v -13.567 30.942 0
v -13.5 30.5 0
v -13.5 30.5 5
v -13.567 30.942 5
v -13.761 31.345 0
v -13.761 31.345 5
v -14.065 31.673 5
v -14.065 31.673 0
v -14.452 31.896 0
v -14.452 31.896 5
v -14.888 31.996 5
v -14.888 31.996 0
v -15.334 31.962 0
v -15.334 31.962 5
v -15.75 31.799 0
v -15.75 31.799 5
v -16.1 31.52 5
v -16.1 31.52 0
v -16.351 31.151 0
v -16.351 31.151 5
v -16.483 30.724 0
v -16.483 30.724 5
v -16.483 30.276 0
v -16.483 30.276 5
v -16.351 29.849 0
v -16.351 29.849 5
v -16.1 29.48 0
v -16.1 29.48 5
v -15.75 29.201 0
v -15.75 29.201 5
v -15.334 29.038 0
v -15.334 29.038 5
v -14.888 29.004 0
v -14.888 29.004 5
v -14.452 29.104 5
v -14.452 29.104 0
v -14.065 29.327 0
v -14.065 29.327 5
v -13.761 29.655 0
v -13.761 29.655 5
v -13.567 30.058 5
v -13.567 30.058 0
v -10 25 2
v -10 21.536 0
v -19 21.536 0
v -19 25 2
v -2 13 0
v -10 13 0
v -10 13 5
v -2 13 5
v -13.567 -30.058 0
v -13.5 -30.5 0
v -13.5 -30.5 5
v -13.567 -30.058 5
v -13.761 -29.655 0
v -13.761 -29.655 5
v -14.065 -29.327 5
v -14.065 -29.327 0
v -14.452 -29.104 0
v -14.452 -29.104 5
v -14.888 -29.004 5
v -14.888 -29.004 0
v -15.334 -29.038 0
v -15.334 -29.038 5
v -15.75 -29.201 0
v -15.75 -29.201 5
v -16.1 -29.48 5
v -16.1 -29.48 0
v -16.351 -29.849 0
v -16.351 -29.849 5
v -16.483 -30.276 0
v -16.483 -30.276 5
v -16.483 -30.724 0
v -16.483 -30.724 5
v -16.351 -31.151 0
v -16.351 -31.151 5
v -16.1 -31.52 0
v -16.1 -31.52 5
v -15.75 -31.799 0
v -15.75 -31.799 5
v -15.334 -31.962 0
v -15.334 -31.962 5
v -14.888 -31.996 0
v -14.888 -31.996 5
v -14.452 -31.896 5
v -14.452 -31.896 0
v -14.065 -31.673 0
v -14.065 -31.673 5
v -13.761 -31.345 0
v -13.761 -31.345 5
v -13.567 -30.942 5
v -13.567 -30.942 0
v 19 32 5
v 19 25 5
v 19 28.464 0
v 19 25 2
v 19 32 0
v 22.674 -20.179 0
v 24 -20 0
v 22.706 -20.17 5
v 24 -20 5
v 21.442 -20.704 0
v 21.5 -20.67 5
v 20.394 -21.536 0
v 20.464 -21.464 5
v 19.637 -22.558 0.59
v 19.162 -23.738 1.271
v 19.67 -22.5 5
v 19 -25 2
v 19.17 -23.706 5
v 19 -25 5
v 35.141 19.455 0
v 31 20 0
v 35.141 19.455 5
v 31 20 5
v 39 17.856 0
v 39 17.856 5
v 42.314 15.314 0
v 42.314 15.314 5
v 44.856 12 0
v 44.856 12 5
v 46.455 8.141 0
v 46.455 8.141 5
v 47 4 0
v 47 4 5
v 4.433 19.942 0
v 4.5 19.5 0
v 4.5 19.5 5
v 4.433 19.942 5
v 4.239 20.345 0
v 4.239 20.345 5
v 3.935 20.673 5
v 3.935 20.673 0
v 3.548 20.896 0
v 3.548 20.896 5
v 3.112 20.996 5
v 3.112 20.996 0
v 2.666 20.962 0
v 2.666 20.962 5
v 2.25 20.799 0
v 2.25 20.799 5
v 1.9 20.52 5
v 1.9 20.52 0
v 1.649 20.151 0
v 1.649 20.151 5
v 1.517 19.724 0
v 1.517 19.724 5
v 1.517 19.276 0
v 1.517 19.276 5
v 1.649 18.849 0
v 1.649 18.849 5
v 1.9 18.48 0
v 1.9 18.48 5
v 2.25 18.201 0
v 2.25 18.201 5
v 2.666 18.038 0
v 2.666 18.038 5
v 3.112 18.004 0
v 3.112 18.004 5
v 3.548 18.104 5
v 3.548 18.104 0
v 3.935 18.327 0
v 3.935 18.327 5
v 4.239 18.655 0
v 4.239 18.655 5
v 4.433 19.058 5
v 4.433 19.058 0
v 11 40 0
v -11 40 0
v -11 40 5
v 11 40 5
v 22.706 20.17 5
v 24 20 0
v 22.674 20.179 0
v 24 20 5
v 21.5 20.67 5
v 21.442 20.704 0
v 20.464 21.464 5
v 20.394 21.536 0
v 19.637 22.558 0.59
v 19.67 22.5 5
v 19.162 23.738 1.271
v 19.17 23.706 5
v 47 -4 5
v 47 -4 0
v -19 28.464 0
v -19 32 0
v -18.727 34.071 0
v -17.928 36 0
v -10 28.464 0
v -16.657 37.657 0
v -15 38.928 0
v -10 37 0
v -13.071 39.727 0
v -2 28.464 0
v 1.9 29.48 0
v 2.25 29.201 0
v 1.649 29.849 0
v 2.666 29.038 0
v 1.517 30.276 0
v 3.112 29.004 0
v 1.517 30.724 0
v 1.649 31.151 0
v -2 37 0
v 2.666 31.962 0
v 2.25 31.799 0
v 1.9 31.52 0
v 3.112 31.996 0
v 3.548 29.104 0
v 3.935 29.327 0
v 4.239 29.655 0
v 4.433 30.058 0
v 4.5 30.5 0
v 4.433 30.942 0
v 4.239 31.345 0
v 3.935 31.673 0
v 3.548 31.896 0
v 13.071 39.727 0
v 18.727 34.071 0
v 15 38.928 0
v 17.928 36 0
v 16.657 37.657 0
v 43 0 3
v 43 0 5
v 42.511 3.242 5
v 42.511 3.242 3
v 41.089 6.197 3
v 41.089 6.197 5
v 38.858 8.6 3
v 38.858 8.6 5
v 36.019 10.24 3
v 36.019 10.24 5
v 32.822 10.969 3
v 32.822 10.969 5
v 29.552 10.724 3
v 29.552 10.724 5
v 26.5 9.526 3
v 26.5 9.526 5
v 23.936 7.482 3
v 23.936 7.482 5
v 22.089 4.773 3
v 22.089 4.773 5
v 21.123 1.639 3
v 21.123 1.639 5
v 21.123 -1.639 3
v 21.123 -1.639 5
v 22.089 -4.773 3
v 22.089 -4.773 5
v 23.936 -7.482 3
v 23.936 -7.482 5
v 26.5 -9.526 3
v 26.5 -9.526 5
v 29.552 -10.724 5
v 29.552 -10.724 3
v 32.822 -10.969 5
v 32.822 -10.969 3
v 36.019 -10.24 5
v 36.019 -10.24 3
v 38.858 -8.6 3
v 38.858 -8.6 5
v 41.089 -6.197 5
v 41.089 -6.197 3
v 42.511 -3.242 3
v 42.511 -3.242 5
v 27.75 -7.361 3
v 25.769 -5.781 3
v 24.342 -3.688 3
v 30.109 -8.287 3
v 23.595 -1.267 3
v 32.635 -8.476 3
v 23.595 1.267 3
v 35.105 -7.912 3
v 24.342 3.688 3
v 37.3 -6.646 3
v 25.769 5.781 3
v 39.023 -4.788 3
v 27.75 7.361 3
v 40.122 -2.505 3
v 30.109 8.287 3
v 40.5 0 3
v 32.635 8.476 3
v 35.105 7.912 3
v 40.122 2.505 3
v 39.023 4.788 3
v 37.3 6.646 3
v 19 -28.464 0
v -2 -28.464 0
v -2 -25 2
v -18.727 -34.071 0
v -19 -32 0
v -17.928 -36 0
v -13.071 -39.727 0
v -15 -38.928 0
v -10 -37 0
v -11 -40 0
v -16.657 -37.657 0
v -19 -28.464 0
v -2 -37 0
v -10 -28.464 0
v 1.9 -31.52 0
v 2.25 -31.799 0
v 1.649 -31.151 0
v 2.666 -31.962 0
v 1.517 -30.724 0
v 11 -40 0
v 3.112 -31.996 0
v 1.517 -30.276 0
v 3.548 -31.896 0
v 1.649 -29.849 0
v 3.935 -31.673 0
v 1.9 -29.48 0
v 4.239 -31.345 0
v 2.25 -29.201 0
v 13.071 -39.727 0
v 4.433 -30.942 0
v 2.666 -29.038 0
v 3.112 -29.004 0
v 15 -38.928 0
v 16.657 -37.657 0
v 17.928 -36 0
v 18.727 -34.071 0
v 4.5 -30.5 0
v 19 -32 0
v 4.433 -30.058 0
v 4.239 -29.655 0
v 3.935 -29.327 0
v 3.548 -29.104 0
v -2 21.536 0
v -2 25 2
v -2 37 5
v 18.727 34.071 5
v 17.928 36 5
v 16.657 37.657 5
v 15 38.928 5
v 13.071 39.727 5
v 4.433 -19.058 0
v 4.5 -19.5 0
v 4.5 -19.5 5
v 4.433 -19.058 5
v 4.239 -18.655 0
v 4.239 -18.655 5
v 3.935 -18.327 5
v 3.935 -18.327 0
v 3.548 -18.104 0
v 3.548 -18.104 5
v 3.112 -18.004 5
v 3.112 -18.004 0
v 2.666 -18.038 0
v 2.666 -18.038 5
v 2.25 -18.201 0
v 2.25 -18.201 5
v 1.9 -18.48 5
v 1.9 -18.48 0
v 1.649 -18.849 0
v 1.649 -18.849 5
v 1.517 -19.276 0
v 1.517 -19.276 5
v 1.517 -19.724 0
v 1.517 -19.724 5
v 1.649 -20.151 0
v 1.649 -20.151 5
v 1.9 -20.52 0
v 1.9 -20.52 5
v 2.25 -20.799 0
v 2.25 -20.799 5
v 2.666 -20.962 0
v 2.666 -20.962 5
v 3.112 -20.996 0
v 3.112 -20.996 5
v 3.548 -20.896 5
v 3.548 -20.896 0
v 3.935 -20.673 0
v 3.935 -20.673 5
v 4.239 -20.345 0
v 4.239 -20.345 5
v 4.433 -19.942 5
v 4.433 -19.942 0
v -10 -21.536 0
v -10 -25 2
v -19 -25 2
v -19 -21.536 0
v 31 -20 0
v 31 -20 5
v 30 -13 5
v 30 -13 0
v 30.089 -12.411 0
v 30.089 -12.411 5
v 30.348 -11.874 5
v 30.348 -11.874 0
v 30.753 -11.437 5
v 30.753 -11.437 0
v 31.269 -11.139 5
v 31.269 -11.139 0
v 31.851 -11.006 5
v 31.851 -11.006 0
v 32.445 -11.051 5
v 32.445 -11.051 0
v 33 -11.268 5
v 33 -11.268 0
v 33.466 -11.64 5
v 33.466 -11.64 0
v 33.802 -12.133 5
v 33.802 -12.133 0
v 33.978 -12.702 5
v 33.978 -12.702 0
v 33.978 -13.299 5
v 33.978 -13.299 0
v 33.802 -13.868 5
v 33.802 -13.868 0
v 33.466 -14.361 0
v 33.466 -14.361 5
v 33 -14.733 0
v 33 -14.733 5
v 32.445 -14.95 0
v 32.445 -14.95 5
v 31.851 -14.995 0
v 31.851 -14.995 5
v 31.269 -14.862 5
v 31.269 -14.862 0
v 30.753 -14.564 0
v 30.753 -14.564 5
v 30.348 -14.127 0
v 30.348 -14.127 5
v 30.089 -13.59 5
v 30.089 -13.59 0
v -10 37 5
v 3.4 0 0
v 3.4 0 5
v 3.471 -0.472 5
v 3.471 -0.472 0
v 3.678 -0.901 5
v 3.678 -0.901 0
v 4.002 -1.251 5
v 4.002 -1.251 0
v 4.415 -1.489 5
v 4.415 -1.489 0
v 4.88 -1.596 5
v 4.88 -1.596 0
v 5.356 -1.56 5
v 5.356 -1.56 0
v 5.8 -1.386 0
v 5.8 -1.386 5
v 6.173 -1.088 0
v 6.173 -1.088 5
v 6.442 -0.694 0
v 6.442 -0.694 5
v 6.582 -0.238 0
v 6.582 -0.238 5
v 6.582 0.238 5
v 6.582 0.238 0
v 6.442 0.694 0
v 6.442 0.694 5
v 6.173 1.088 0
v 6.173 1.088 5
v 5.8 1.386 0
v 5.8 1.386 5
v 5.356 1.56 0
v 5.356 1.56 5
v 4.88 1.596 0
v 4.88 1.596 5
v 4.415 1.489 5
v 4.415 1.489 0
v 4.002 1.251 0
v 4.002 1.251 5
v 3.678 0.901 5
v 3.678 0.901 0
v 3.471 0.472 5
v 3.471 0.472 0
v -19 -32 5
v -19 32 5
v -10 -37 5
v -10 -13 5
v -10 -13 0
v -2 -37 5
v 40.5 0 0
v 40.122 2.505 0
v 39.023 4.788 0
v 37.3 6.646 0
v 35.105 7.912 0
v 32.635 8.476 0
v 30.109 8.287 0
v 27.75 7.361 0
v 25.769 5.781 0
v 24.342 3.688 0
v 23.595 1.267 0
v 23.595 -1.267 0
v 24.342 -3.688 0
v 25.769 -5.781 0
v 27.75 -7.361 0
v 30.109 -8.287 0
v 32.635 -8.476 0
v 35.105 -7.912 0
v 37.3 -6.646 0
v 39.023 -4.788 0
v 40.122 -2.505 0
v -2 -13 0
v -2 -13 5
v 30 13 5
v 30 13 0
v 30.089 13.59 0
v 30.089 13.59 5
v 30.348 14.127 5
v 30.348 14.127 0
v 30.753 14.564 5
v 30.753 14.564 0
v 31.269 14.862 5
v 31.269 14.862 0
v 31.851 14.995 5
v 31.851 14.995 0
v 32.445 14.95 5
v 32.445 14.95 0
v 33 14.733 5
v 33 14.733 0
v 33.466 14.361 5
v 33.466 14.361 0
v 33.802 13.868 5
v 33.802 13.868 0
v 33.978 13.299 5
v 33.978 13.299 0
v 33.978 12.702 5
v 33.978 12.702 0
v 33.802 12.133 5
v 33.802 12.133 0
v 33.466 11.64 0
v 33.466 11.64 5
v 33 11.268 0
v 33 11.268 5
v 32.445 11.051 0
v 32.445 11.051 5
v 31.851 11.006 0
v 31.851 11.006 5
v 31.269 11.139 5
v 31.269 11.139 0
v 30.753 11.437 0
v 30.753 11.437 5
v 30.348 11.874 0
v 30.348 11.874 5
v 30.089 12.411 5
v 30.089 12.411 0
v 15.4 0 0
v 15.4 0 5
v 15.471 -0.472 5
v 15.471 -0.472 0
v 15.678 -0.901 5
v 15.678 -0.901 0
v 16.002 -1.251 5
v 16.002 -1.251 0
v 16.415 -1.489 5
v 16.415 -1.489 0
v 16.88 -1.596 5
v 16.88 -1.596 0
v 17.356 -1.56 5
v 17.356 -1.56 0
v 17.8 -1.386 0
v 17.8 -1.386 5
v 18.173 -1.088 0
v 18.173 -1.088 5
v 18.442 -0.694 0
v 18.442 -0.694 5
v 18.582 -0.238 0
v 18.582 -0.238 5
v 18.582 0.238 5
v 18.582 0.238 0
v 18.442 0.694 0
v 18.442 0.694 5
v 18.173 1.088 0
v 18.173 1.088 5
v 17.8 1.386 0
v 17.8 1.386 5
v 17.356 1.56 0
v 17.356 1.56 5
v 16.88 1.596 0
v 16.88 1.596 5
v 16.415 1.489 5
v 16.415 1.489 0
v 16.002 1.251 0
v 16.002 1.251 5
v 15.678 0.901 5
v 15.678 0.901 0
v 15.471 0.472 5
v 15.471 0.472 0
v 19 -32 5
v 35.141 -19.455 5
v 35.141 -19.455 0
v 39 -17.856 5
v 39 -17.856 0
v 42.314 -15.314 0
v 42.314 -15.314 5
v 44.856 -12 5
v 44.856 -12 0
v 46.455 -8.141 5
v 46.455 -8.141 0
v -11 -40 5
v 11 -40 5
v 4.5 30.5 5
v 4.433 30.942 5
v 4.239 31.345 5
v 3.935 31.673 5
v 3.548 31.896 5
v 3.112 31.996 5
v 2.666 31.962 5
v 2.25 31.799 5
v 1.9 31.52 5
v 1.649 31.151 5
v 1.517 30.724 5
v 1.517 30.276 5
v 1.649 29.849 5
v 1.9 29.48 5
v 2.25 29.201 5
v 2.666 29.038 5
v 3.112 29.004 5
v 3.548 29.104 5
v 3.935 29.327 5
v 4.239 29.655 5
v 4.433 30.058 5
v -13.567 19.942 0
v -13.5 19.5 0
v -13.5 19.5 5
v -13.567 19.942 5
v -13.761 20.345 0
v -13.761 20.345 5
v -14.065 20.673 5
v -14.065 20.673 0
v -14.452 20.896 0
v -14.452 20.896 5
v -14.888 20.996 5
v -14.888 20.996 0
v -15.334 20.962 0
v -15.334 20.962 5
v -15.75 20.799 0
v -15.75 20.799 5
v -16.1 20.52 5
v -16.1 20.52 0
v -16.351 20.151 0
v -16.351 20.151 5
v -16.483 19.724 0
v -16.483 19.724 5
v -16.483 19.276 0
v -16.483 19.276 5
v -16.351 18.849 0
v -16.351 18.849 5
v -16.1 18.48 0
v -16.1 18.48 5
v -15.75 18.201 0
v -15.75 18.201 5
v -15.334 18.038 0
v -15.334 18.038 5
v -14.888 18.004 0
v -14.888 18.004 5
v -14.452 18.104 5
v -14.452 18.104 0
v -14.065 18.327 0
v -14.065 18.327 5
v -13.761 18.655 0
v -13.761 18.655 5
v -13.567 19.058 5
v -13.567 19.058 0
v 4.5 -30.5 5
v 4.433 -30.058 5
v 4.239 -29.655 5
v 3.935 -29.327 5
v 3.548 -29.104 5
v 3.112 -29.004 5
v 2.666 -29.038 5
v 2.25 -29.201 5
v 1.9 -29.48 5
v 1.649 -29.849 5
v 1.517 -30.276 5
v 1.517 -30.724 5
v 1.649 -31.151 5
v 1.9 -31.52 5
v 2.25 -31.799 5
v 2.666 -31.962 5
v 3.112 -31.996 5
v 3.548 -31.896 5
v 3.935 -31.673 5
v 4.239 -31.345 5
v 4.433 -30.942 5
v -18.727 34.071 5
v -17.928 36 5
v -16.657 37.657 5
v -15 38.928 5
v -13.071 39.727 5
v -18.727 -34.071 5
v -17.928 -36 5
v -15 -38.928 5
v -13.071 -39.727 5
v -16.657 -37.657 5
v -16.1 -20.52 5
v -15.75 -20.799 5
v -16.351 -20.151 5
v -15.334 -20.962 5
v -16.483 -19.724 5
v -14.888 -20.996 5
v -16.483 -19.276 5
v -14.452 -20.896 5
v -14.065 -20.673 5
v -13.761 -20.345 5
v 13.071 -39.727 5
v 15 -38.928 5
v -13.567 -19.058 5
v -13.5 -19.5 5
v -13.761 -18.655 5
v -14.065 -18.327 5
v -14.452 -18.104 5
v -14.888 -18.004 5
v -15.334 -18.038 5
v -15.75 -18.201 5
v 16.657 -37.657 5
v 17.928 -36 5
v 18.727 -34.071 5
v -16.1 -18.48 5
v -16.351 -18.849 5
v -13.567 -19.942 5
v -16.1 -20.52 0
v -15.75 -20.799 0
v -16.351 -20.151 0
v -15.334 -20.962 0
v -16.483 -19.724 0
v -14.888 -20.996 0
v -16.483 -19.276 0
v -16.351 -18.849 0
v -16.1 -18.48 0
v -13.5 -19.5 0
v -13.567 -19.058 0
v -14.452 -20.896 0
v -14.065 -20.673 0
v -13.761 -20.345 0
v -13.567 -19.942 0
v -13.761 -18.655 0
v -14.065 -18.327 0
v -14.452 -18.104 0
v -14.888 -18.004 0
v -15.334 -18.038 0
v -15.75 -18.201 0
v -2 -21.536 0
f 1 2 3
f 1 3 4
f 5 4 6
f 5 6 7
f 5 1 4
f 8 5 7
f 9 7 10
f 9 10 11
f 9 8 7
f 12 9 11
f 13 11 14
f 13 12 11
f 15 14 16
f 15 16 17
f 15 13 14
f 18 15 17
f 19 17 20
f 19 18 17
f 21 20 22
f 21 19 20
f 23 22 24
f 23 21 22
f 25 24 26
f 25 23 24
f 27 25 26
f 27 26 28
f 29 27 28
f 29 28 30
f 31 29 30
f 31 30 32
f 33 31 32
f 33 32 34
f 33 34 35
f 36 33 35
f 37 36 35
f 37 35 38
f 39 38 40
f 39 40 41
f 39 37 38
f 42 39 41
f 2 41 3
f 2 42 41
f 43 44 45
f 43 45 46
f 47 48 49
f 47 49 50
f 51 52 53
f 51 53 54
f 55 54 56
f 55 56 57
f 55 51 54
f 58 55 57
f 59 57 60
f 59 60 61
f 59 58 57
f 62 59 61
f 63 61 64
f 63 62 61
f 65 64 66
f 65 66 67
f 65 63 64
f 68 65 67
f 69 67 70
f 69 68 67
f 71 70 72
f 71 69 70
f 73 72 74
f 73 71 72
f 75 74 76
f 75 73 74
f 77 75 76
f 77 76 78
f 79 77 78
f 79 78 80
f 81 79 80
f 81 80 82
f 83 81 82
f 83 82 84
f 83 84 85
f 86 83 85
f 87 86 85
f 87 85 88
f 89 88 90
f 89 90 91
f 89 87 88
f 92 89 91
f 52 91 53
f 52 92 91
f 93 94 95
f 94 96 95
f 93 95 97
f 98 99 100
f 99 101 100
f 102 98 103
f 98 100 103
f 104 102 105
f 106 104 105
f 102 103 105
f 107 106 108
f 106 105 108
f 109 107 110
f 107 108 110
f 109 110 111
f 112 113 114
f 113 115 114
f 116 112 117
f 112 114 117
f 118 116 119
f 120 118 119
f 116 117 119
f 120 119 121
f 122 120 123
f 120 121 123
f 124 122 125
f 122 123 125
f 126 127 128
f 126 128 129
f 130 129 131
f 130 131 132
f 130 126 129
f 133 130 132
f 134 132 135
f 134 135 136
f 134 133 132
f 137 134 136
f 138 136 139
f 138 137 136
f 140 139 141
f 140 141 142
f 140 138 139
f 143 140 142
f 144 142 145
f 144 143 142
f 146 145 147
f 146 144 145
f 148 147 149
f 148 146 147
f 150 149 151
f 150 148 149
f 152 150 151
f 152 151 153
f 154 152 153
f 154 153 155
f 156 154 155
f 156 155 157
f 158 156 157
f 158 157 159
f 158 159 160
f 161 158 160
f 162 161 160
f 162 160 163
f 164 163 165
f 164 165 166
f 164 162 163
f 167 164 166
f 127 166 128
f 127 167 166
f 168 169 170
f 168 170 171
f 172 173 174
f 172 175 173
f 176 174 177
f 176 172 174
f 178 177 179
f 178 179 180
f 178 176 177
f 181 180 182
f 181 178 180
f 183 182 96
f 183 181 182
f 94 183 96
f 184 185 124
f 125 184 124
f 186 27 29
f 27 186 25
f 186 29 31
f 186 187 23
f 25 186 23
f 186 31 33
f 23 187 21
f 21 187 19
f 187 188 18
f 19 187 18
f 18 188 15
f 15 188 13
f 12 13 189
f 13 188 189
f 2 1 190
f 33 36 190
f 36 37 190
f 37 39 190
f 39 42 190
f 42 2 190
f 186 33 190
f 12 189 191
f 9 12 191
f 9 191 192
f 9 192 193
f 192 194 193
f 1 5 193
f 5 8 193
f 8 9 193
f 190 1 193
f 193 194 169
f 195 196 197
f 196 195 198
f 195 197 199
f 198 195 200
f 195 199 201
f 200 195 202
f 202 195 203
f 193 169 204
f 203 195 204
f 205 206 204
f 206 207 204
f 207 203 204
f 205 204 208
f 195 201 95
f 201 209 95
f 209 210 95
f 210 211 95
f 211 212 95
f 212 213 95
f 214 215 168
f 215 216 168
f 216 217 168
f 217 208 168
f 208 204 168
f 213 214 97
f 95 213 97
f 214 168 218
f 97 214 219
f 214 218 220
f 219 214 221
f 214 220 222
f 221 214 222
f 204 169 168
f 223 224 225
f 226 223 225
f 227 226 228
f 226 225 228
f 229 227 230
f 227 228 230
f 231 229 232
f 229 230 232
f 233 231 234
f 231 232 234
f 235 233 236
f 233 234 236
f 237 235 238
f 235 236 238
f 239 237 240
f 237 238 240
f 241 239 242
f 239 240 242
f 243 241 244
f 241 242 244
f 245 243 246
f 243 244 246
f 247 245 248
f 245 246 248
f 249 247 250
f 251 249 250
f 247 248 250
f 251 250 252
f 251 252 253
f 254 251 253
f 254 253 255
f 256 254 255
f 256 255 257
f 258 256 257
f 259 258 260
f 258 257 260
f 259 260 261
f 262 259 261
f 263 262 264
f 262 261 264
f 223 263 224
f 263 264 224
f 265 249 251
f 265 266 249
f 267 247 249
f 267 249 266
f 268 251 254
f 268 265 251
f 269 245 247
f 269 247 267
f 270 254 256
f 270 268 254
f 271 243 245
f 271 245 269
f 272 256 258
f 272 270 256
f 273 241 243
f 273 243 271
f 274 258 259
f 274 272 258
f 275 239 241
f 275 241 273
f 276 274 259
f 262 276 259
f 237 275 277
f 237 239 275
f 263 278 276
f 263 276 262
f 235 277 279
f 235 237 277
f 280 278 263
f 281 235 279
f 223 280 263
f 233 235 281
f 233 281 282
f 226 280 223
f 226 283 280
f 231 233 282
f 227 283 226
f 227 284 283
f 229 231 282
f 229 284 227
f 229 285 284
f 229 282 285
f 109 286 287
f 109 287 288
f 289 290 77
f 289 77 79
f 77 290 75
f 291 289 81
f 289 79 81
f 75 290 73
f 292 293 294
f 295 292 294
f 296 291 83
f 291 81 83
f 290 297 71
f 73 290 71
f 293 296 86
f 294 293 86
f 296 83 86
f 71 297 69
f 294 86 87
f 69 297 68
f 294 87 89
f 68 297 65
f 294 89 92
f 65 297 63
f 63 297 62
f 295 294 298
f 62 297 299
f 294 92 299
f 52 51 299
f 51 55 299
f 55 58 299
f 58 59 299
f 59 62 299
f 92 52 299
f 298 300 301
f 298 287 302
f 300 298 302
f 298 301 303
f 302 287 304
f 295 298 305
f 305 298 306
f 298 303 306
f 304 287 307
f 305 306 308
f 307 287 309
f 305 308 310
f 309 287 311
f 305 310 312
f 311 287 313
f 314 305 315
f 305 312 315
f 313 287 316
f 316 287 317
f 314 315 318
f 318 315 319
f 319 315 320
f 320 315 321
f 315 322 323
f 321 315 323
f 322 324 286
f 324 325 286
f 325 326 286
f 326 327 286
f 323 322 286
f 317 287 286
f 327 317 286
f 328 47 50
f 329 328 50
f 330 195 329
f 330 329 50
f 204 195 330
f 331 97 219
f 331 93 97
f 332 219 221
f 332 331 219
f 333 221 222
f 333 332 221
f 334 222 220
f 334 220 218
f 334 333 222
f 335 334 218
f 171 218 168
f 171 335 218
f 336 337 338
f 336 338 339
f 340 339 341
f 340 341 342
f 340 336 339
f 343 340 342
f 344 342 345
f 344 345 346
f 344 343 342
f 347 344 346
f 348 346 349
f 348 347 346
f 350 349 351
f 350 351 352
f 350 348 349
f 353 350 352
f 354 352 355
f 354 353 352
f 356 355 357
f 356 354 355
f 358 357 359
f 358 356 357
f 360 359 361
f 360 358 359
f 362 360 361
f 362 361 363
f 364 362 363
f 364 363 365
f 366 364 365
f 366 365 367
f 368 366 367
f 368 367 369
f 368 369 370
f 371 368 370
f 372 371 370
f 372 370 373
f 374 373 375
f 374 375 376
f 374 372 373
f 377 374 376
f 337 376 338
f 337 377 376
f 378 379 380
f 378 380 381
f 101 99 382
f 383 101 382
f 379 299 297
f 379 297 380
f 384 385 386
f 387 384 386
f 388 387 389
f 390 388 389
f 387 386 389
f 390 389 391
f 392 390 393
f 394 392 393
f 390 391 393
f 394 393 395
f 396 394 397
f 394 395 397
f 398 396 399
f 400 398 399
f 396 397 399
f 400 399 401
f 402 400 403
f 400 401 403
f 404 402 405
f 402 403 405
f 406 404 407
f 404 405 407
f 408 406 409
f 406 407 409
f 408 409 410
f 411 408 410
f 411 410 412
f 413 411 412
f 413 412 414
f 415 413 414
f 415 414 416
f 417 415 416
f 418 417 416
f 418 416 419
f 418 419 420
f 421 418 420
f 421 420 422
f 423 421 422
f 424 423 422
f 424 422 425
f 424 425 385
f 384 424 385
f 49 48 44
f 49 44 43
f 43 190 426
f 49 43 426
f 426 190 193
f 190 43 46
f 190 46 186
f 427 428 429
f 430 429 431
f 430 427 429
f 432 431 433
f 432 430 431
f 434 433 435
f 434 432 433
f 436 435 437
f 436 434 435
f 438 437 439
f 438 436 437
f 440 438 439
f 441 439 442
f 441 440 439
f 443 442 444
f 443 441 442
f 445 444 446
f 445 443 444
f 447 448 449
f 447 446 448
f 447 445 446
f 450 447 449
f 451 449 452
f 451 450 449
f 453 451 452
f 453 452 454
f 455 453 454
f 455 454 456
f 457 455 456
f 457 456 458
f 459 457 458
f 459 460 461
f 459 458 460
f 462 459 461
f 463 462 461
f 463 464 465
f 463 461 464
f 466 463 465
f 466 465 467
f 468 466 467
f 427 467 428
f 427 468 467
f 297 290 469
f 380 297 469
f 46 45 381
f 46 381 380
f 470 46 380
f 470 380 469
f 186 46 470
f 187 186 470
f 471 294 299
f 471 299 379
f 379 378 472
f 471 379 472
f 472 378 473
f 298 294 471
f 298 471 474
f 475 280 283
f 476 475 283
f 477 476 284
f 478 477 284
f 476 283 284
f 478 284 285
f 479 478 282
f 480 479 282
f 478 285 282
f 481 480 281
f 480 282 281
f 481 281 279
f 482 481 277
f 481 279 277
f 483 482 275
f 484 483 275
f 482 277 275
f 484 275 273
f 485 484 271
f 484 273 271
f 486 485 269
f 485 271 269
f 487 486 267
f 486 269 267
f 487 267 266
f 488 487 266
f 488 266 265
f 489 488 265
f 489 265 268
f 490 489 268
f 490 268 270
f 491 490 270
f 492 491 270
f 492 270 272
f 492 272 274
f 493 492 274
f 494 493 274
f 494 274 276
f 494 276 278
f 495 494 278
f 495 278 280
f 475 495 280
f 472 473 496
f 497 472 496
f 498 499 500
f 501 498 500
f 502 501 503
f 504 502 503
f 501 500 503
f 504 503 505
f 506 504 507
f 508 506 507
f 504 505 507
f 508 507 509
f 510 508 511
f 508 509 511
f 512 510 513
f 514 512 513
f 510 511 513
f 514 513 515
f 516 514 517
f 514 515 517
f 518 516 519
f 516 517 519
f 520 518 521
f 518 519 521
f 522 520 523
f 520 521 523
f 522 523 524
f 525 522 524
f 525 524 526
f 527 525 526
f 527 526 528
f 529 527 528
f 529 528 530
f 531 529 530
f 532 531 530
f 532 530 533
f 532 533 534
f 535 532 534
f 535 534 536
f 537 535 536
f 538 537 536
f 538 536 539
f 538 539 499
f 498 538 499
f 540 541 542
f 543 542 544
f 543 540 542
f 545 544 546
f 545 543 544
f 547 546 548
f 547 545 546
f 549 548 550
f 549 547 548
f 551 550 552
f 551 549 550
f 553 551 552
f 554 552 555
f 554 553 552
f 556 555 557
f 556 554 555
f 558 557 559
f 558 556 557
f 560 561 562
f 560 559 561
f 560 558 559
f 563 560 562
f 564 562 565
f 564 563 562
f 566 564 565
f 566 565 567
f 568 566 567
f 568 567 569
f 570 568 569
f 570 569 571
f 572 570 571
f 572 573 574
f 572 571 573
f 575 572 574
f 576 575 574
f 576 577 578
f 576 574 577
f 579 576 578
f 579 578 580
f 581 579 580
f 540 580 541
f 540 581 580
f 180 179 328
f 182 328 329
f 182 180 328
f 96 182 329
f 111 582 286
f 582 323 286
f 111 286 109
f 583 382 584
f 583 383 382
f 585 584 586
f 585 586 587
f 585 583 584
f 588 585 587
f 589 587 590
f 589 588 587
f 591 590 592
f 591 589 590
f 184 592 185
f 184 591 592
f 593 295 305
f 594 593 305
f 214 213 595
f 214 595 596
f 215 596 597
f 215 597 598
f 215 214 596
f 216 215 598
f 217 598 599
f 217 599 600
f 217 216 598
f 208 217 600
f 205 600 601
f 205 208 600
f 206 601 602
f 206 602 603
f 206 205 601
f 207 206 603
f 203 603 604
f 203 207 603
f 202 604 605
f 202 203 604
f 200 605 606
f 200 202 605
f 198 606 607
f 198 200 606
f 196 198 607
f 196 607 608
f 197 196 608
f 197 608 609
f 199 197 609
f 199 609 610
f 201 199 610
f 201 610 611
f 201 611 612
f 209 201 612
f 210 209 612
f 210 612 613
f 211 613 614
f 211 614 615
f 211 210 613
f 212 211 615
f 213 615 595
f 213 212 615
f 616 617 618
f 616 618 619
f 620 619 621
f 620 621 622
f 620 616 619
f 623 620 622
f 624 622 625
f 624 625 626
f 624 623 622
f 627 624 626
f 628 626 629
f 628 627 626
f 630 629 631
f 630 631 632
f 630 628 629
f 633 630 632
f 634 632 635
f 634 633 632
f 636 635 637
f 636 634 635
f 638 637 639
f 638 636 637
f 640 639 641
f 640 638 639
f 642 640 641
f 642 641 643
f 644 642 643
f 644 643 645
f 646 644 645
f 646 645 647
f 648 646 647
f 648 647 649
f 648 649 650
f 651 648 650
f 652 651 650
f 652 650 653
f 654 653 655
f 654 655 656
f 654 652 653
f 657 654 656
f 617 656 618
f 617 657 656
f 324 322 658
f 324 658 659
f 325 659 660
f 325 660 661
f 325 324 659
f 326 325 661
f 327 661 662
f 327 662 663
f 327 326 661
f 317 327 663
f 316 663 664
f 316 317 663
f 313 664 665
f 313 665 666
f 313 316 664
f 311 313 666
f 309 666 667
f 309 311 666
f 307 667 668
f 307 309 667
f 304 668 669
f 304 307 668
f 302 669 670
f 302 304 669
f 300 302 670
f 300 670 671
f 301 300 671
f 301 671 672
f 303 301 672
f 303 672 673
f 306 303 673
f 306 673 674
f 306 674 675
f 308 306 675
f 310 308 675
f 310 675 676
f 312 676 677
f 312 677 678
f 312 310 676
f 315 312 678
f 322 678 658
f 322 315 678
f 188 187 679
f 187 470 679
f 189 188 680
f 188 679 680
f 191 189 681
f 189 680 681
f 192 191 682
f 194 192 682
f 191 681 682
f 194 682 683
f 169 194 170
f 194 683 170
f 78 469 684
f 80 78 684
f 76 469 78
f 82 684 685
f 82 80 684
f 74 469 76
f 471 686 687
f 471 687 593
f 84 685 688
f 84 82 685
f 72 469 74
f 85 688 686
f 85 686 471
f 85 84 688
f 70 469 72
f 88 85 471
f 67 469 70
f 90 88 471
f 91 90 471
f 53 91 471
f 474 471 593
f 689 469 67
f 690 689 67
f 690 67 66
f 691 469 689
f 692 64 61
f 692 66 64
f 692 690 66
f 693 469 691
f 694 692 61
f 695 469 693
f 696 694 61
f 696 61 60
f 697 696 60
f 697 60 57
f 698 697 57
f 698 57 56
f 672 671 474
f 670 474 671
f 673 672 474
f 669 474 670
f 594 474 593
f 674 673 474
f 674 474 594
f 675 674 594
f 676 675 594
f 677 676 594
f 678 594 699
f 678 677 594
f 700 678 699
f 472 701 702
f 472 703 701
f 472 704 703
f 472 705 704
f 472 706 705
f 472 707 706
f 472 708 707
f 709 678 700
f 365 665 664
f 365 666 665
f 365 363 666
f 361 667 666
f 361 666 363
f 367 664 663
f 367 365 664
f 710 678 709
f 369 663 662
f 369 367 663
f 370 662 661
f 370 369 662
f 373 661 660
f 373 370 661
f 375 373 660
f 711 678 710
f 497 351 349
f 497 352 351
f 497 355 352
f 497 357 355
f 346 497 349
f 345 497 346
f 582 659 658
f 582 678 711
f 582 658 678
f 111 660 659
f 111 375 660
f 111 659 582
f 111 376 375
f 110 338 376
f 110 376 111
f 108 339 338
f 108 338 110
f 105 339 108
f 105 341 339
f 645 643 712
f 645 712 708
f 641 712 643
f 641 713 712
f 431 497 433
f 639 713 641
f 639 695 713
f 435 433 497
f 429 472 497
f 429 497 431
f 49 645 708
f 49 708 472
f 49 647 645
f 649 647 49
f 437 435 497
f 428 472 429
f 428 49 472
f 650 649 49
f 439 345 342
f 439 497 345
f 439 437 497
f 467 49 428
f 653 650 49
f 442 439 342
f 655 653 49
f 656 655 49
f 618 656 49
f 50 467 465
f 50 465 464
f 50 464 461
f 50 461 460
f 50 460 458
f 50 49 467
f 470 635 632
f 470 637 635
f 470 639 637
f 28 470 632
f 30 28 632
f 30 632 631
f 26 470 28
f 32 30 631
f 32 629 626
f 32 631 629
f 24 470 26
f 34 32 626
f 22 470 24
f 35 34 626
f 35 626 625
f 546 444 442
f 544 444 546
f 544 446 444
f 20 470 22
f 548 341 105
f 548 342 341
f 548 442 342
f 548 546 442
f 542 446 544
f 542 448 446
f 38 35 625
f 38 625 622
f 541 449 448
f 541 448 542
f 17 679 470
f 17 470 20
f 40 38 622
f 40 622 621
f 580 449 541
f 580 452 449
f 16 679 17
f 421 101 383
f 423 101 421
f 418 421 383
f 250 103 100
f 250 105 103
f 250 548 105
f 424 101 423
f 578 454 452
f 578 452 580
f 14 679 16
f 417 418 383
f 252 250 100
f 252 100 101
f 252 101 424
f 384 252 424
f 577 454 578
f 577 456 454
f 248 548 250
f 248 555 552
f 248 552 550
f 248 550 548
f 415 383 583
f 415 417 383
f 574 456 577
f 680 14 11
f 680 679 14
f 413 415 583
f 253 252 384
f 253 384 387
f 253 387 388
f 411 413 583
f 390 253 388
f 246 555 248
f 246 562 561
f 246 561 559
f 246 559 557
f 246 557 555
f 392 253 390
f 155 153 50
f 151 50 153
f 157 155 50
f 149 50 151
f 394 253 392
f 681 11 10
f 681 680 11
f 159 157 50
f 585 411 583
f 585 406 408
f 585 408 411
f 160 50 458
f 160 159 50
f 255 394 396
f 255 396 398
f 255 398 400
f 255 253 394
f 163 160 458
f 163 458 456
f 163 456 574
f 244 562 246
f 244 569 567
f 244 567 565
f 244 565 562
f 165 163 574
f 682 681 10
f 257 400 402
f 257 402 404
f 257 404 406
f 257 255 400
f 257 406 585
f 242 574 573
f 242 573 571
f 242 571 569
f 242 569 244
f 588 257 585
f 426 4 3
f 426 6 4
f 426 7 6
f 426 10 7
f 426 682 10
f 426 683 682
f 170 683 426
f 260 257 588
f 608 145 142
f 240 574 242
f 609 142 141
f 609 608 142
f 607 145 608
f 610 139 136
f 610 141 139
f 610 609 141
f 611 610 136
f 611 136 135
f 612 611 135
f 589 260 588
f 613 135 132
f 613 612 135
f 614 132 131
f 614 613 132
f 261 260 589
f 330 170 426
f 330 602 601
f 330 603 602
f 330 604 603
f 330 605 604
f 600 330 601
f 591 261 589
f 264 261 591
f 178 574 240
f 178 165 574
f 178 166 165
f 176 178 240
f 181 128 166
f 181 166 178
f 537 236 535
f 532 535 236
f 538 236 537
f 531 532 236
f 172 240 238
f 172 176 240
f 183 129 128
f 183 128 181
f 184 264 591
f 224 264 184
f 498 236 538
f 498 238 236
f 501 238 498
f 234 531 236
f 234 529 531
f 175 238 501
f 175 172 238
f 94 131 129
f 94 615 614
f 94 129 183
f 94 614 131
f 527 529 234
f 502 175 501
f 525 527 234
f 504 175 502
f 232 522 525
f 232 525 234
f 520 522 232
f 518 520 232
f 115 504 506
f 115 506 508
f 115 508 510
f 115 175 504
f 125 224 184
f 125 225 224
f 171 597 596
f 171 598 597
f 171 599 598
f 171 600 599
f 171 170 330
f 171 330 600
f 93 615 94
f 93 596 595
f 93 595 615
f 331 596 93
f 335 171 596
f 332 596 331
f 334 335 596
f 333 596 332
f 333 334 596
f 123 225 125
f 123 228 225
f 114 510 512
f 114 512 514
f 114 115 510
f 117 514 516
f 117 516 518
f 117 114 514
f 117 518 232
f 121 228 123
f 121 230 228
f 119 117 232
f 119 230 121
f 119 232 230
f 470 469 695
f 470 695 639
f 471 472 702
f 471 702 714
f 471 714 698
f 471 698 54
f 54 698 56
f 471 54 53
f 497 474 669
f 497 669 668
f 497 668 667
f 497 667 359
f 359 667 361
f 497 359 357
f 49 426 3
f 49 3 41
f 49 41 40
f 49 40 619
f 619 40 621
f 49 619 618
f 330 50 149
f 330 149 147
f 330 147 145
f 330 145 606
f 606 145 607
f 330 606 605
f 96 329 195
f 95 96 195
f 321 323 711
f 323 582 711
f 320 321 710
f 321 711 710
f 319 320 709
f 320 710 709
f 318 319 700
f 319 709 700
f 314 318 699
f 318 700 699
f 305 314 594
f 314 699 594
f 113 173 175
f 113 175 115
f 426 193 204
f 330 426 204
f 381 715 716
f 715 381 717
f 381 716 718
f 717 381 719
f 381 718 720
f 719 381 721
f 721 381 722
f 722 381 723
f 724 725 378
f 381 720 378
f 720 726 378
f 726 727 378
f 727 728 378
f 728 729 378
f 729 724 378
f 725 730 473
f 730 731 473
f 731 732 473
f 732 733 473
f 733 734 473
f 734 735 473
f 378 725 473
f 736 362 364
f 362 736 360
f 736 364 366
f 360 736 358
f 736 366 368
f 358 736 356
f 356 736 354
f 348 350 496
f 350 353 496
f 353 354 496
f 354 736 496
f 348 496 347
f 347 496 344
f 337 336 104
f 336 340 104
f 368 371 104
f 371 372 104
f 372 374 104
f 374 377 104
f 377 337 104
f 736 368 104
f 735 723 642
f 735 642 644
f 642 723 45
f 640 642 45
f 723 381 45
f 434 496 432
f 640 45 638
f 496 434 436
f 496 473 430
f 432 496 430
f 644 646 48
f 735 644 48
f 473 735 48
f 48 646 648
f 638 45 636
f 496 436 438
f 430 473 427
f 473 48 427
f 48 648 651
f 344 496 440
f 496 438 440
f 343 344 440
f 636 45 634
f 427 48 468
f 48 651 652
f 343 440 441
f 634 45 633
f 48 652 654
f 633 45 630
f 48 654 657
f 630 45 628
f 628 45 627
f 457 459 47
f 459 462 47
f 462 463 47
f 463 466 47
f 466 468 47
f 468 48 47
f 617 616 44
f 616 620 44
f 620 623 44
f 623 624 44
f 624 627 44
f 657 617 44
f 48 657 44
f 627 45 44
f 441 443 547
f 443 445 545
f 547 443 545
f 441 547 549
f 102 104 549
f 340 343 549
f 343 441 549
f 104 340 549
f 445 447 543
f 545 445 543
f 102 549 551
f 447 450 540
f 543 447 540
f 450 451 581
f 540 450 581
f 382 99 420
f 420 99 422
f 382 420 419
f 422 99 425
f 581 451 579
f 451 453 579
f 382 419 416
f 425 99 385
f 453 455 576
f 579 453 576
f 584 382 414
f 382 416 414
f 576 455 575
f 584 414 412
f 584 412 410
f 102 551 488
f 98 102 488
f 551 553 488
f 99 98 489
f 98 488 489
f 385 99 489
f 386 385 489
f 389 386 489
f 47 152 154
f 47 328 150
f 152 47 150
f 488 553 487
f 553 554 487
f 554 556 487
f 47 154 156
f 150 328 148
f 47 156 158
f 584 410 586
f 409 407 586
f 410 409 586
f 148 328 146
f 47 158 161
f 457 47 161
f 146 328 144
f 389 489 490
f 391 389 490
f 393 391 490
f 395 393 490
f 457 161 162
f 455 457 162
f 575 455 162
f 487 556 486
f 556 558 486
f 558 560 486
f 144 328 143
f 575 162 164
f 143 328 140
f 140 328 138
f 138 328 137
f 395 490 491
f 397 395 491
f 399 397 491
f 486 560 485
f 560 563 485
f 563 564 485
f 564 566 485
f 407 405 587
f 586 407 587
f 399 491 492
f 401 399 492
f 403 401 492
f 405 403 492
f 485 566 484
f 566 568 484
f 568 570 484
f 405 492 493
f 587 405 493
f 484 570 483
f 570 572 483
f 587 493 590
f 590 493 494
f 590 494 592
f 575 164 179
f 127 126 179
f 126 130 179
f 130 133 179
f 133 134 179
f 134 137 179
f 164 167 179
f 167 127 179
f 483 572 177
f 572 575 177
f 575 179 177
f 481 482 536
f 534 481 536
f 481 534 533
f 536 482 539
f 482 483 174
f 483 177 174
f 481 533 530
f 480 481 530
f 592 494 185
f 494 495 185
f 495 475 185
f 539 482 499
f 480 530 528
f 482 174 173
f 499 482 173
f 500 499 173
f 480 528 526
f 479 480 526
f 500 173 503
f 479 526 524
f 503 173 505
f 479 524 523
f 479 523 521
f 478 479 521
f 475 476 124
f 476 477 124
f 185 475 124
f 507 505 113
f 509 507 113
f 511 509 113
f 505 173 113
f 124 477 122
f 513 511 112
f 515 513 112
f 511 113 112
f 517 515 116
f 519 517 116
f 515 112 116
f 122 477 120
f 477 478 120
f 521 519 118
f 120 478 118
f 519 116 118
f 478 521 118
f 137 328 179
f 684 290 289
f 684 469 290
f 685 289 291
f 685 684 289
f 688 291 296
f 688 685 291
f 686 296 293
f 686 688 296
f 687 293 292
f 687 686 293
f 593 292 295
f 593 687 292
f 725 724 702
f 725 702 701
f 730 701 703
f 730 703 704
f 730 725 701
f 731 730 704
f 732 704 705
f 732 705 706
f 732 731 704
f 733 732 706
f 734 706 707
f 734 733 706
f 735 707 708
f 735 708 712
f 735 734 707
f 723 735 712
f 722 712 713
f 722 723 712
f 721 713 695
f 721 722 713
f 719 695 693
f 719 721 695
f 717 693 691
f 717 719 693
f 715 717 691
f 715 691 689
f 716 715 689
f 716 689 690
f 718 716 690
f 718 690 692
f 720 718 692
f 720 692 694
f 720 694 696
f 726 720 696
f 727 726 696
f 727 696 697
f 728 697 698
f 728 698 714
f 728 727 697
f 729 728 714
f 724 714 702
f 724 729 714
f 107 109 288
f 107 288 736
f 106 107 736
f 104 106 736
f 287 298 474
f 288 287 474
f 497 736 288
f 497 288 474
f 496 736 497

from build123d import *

# Parameters (mm, degrees)
ESBO_O1_R                = 1.5
ESBO_O1_W                = 8
ESBO_O1_H                = 24
RESSALTO_EXTRUS_O1_DEPTH = 5
CORTE_EXTRUS_O1_DEPTH    = 56.398555938
ESBO_O6_R                = 8.5
CORTE_EXTRUS_O3_DEPTH    = 62.919302322
ESBO_O6_3_R              = 11
ESBO_O6_3_R_2            = 8.5
CORTE_EXTRUS_O4_DEPTH    = 2
FURO_ROSCADO_DE_M41_D    = 4
FILETE1_R                = 16
FILETE2_R                = 5
FILETE3_R                = 8
ESBO_O9_R                = 1.6
CORTE_EXTRUS_O9_DEPTH    = 62.919302322


with BuildPart() as part:
    # Esboço1 → Ressalto-extrusão1 (new body)
    with BuildSketch(Plane.XY):
        Polygon((19, 40), (-19, 40), (-19, -40), (19, -40), (19, -20), (47, -20), (47, 20), (19, 20), align=None)
        with Locations((-15, -30.5)):
            Circle(ESBO_O1_R, mode=Mode.SUBTRACT)
        with Locations((-6, -25)):
            Rectangle(ESBO_O1_W, ESBO_O1_H, mode=Mode.SUBTRACT)
        with Locations((3, -30.5)):
            Circle(ESBO_O1_R, mode=Mode.SUBTRACT)
        with Locations((-15, -19.5)):
            Circle(ESBO_O1_R, mode=Mode.SUBTRACT)
        with Locations((3, -19.5)):
            Circle(ESBO_O1_R, mode=Mode.SUBTRACT)
        with Locations((-15, 19.5)):
            Circle(ESBO_O1_R, mode=Mode.SUBTRACT)
        with Locations((3, 19.5)):
            Circle(ESBO_O1_R, mode=Mode.SUBTRACT)
        with Locations((-6, 25)):
            Rectangle(ESBO_O1_W, ESBO_O1_H, mode=Mode.SUBTRACT)
        with Locations((-15, 30.5)):
            Circle(ESBO_O1_R, mode=Mode.SUBTRACT)
        with Locations((3, 30.5)):
            Circle(ESBO_O1_R, mode=Mode.SUBTRACT)
    extrude(amount=RESSALTO_EXTRUS_O1_DEPTH)

    # Esboço2 → Corte-extrusão1 (cut, through all)
    with BuildSketch(Plane(origin=(19, 0, 0), x_dir=(0, 0, -1), z_dir=(1, 0, 0))):
        Polygon((-2, 25), (0, 28.464101615), (0, 21.535898385), align=None)
        Polygon((-2, -25), (0, -21.535898385), (0, -28.464101615), align=None)
    extrude(amount=-CORTE_EXTRUS_O1_DEPTH, mode=Mode.SUBTRACT)

    # Esboço6 → Corte-extrusão3 (cut, through all)
    with BuildSketch(Plane.XY.offset(5)):
        with Locations((32, 0)):
            Circle(ESBO_O6_R)
    extrude(amount=-CORTE_EXTRUS_O3_DEPTH, mode=Mode.SUBTRACT)

    # Esboço6<3> → Corte-extrusão4 (cut)
    with BuildSketch(Plane.XY.offset(5)):
        with Locations((32, 0)):
            Circle(ESBO_O6_3_R)
        with Locations((32, 0)):
            Circle(ESBO_O6_3_R_2, mode=Mode.SUBTRACT)
    extrude(amount=-CORTE_EXTRUS_O4_DEPTH, mode=Mode.SUBTRACT)

    # Furo roscado de M41 (through all)
    with Locations(Plane(origin=(-8.290173831, 15.833247685, 5), x_dir=(1, 0, 0), z_dir=(0, 0, 1))):
        with Locations((40.290173831, -2.832747685), (40.290173831, -28.833747685)):
            Hole(FURO_ROSCADO_DE_M41_D / 2)

    # Filete1
    filete1_edges = [part.edges().sort_by_distance(p)[0] for p in [
        (47, -20, 2.5),
        (47, 20, 2.5),
    ]]
    fillet(filete1_edges, radius=FILETE1_R)

    # Filete2
    filete2_edges = [part.edges().sort_by_distance(p)[0] for p in [
        (19, -20, 2.5),
        (19, 20, 2.5),
    ]]
    fillet(filete2_edges, radius=FILETE2_R)

    # Filete3
    filete3_edges = [part.edges().sort_by_distance(p)[0] for p in [
        (-19, -40, 2.5),
        (19, -40, 2.5),
        (19, 40, 2.5),
        (-19, 40, 2.5),
    ]]
    fillet(filete3_edges, radius=FILETE3_R)

    # Esboço9 → Corte-extrusão9 (cut, through all)
    with BuildSketch(Plane.XY):
        with Locations((5, 0)):
            Circle(ESBO_O9_R)
        with Locations((17, 0)):
            Circle(ESBO_O9_R)
    extrude(amount=CORTE_EXTRUS_O9_DEPTH, mode=Mode.SUBTRACT)


solid = part.part
